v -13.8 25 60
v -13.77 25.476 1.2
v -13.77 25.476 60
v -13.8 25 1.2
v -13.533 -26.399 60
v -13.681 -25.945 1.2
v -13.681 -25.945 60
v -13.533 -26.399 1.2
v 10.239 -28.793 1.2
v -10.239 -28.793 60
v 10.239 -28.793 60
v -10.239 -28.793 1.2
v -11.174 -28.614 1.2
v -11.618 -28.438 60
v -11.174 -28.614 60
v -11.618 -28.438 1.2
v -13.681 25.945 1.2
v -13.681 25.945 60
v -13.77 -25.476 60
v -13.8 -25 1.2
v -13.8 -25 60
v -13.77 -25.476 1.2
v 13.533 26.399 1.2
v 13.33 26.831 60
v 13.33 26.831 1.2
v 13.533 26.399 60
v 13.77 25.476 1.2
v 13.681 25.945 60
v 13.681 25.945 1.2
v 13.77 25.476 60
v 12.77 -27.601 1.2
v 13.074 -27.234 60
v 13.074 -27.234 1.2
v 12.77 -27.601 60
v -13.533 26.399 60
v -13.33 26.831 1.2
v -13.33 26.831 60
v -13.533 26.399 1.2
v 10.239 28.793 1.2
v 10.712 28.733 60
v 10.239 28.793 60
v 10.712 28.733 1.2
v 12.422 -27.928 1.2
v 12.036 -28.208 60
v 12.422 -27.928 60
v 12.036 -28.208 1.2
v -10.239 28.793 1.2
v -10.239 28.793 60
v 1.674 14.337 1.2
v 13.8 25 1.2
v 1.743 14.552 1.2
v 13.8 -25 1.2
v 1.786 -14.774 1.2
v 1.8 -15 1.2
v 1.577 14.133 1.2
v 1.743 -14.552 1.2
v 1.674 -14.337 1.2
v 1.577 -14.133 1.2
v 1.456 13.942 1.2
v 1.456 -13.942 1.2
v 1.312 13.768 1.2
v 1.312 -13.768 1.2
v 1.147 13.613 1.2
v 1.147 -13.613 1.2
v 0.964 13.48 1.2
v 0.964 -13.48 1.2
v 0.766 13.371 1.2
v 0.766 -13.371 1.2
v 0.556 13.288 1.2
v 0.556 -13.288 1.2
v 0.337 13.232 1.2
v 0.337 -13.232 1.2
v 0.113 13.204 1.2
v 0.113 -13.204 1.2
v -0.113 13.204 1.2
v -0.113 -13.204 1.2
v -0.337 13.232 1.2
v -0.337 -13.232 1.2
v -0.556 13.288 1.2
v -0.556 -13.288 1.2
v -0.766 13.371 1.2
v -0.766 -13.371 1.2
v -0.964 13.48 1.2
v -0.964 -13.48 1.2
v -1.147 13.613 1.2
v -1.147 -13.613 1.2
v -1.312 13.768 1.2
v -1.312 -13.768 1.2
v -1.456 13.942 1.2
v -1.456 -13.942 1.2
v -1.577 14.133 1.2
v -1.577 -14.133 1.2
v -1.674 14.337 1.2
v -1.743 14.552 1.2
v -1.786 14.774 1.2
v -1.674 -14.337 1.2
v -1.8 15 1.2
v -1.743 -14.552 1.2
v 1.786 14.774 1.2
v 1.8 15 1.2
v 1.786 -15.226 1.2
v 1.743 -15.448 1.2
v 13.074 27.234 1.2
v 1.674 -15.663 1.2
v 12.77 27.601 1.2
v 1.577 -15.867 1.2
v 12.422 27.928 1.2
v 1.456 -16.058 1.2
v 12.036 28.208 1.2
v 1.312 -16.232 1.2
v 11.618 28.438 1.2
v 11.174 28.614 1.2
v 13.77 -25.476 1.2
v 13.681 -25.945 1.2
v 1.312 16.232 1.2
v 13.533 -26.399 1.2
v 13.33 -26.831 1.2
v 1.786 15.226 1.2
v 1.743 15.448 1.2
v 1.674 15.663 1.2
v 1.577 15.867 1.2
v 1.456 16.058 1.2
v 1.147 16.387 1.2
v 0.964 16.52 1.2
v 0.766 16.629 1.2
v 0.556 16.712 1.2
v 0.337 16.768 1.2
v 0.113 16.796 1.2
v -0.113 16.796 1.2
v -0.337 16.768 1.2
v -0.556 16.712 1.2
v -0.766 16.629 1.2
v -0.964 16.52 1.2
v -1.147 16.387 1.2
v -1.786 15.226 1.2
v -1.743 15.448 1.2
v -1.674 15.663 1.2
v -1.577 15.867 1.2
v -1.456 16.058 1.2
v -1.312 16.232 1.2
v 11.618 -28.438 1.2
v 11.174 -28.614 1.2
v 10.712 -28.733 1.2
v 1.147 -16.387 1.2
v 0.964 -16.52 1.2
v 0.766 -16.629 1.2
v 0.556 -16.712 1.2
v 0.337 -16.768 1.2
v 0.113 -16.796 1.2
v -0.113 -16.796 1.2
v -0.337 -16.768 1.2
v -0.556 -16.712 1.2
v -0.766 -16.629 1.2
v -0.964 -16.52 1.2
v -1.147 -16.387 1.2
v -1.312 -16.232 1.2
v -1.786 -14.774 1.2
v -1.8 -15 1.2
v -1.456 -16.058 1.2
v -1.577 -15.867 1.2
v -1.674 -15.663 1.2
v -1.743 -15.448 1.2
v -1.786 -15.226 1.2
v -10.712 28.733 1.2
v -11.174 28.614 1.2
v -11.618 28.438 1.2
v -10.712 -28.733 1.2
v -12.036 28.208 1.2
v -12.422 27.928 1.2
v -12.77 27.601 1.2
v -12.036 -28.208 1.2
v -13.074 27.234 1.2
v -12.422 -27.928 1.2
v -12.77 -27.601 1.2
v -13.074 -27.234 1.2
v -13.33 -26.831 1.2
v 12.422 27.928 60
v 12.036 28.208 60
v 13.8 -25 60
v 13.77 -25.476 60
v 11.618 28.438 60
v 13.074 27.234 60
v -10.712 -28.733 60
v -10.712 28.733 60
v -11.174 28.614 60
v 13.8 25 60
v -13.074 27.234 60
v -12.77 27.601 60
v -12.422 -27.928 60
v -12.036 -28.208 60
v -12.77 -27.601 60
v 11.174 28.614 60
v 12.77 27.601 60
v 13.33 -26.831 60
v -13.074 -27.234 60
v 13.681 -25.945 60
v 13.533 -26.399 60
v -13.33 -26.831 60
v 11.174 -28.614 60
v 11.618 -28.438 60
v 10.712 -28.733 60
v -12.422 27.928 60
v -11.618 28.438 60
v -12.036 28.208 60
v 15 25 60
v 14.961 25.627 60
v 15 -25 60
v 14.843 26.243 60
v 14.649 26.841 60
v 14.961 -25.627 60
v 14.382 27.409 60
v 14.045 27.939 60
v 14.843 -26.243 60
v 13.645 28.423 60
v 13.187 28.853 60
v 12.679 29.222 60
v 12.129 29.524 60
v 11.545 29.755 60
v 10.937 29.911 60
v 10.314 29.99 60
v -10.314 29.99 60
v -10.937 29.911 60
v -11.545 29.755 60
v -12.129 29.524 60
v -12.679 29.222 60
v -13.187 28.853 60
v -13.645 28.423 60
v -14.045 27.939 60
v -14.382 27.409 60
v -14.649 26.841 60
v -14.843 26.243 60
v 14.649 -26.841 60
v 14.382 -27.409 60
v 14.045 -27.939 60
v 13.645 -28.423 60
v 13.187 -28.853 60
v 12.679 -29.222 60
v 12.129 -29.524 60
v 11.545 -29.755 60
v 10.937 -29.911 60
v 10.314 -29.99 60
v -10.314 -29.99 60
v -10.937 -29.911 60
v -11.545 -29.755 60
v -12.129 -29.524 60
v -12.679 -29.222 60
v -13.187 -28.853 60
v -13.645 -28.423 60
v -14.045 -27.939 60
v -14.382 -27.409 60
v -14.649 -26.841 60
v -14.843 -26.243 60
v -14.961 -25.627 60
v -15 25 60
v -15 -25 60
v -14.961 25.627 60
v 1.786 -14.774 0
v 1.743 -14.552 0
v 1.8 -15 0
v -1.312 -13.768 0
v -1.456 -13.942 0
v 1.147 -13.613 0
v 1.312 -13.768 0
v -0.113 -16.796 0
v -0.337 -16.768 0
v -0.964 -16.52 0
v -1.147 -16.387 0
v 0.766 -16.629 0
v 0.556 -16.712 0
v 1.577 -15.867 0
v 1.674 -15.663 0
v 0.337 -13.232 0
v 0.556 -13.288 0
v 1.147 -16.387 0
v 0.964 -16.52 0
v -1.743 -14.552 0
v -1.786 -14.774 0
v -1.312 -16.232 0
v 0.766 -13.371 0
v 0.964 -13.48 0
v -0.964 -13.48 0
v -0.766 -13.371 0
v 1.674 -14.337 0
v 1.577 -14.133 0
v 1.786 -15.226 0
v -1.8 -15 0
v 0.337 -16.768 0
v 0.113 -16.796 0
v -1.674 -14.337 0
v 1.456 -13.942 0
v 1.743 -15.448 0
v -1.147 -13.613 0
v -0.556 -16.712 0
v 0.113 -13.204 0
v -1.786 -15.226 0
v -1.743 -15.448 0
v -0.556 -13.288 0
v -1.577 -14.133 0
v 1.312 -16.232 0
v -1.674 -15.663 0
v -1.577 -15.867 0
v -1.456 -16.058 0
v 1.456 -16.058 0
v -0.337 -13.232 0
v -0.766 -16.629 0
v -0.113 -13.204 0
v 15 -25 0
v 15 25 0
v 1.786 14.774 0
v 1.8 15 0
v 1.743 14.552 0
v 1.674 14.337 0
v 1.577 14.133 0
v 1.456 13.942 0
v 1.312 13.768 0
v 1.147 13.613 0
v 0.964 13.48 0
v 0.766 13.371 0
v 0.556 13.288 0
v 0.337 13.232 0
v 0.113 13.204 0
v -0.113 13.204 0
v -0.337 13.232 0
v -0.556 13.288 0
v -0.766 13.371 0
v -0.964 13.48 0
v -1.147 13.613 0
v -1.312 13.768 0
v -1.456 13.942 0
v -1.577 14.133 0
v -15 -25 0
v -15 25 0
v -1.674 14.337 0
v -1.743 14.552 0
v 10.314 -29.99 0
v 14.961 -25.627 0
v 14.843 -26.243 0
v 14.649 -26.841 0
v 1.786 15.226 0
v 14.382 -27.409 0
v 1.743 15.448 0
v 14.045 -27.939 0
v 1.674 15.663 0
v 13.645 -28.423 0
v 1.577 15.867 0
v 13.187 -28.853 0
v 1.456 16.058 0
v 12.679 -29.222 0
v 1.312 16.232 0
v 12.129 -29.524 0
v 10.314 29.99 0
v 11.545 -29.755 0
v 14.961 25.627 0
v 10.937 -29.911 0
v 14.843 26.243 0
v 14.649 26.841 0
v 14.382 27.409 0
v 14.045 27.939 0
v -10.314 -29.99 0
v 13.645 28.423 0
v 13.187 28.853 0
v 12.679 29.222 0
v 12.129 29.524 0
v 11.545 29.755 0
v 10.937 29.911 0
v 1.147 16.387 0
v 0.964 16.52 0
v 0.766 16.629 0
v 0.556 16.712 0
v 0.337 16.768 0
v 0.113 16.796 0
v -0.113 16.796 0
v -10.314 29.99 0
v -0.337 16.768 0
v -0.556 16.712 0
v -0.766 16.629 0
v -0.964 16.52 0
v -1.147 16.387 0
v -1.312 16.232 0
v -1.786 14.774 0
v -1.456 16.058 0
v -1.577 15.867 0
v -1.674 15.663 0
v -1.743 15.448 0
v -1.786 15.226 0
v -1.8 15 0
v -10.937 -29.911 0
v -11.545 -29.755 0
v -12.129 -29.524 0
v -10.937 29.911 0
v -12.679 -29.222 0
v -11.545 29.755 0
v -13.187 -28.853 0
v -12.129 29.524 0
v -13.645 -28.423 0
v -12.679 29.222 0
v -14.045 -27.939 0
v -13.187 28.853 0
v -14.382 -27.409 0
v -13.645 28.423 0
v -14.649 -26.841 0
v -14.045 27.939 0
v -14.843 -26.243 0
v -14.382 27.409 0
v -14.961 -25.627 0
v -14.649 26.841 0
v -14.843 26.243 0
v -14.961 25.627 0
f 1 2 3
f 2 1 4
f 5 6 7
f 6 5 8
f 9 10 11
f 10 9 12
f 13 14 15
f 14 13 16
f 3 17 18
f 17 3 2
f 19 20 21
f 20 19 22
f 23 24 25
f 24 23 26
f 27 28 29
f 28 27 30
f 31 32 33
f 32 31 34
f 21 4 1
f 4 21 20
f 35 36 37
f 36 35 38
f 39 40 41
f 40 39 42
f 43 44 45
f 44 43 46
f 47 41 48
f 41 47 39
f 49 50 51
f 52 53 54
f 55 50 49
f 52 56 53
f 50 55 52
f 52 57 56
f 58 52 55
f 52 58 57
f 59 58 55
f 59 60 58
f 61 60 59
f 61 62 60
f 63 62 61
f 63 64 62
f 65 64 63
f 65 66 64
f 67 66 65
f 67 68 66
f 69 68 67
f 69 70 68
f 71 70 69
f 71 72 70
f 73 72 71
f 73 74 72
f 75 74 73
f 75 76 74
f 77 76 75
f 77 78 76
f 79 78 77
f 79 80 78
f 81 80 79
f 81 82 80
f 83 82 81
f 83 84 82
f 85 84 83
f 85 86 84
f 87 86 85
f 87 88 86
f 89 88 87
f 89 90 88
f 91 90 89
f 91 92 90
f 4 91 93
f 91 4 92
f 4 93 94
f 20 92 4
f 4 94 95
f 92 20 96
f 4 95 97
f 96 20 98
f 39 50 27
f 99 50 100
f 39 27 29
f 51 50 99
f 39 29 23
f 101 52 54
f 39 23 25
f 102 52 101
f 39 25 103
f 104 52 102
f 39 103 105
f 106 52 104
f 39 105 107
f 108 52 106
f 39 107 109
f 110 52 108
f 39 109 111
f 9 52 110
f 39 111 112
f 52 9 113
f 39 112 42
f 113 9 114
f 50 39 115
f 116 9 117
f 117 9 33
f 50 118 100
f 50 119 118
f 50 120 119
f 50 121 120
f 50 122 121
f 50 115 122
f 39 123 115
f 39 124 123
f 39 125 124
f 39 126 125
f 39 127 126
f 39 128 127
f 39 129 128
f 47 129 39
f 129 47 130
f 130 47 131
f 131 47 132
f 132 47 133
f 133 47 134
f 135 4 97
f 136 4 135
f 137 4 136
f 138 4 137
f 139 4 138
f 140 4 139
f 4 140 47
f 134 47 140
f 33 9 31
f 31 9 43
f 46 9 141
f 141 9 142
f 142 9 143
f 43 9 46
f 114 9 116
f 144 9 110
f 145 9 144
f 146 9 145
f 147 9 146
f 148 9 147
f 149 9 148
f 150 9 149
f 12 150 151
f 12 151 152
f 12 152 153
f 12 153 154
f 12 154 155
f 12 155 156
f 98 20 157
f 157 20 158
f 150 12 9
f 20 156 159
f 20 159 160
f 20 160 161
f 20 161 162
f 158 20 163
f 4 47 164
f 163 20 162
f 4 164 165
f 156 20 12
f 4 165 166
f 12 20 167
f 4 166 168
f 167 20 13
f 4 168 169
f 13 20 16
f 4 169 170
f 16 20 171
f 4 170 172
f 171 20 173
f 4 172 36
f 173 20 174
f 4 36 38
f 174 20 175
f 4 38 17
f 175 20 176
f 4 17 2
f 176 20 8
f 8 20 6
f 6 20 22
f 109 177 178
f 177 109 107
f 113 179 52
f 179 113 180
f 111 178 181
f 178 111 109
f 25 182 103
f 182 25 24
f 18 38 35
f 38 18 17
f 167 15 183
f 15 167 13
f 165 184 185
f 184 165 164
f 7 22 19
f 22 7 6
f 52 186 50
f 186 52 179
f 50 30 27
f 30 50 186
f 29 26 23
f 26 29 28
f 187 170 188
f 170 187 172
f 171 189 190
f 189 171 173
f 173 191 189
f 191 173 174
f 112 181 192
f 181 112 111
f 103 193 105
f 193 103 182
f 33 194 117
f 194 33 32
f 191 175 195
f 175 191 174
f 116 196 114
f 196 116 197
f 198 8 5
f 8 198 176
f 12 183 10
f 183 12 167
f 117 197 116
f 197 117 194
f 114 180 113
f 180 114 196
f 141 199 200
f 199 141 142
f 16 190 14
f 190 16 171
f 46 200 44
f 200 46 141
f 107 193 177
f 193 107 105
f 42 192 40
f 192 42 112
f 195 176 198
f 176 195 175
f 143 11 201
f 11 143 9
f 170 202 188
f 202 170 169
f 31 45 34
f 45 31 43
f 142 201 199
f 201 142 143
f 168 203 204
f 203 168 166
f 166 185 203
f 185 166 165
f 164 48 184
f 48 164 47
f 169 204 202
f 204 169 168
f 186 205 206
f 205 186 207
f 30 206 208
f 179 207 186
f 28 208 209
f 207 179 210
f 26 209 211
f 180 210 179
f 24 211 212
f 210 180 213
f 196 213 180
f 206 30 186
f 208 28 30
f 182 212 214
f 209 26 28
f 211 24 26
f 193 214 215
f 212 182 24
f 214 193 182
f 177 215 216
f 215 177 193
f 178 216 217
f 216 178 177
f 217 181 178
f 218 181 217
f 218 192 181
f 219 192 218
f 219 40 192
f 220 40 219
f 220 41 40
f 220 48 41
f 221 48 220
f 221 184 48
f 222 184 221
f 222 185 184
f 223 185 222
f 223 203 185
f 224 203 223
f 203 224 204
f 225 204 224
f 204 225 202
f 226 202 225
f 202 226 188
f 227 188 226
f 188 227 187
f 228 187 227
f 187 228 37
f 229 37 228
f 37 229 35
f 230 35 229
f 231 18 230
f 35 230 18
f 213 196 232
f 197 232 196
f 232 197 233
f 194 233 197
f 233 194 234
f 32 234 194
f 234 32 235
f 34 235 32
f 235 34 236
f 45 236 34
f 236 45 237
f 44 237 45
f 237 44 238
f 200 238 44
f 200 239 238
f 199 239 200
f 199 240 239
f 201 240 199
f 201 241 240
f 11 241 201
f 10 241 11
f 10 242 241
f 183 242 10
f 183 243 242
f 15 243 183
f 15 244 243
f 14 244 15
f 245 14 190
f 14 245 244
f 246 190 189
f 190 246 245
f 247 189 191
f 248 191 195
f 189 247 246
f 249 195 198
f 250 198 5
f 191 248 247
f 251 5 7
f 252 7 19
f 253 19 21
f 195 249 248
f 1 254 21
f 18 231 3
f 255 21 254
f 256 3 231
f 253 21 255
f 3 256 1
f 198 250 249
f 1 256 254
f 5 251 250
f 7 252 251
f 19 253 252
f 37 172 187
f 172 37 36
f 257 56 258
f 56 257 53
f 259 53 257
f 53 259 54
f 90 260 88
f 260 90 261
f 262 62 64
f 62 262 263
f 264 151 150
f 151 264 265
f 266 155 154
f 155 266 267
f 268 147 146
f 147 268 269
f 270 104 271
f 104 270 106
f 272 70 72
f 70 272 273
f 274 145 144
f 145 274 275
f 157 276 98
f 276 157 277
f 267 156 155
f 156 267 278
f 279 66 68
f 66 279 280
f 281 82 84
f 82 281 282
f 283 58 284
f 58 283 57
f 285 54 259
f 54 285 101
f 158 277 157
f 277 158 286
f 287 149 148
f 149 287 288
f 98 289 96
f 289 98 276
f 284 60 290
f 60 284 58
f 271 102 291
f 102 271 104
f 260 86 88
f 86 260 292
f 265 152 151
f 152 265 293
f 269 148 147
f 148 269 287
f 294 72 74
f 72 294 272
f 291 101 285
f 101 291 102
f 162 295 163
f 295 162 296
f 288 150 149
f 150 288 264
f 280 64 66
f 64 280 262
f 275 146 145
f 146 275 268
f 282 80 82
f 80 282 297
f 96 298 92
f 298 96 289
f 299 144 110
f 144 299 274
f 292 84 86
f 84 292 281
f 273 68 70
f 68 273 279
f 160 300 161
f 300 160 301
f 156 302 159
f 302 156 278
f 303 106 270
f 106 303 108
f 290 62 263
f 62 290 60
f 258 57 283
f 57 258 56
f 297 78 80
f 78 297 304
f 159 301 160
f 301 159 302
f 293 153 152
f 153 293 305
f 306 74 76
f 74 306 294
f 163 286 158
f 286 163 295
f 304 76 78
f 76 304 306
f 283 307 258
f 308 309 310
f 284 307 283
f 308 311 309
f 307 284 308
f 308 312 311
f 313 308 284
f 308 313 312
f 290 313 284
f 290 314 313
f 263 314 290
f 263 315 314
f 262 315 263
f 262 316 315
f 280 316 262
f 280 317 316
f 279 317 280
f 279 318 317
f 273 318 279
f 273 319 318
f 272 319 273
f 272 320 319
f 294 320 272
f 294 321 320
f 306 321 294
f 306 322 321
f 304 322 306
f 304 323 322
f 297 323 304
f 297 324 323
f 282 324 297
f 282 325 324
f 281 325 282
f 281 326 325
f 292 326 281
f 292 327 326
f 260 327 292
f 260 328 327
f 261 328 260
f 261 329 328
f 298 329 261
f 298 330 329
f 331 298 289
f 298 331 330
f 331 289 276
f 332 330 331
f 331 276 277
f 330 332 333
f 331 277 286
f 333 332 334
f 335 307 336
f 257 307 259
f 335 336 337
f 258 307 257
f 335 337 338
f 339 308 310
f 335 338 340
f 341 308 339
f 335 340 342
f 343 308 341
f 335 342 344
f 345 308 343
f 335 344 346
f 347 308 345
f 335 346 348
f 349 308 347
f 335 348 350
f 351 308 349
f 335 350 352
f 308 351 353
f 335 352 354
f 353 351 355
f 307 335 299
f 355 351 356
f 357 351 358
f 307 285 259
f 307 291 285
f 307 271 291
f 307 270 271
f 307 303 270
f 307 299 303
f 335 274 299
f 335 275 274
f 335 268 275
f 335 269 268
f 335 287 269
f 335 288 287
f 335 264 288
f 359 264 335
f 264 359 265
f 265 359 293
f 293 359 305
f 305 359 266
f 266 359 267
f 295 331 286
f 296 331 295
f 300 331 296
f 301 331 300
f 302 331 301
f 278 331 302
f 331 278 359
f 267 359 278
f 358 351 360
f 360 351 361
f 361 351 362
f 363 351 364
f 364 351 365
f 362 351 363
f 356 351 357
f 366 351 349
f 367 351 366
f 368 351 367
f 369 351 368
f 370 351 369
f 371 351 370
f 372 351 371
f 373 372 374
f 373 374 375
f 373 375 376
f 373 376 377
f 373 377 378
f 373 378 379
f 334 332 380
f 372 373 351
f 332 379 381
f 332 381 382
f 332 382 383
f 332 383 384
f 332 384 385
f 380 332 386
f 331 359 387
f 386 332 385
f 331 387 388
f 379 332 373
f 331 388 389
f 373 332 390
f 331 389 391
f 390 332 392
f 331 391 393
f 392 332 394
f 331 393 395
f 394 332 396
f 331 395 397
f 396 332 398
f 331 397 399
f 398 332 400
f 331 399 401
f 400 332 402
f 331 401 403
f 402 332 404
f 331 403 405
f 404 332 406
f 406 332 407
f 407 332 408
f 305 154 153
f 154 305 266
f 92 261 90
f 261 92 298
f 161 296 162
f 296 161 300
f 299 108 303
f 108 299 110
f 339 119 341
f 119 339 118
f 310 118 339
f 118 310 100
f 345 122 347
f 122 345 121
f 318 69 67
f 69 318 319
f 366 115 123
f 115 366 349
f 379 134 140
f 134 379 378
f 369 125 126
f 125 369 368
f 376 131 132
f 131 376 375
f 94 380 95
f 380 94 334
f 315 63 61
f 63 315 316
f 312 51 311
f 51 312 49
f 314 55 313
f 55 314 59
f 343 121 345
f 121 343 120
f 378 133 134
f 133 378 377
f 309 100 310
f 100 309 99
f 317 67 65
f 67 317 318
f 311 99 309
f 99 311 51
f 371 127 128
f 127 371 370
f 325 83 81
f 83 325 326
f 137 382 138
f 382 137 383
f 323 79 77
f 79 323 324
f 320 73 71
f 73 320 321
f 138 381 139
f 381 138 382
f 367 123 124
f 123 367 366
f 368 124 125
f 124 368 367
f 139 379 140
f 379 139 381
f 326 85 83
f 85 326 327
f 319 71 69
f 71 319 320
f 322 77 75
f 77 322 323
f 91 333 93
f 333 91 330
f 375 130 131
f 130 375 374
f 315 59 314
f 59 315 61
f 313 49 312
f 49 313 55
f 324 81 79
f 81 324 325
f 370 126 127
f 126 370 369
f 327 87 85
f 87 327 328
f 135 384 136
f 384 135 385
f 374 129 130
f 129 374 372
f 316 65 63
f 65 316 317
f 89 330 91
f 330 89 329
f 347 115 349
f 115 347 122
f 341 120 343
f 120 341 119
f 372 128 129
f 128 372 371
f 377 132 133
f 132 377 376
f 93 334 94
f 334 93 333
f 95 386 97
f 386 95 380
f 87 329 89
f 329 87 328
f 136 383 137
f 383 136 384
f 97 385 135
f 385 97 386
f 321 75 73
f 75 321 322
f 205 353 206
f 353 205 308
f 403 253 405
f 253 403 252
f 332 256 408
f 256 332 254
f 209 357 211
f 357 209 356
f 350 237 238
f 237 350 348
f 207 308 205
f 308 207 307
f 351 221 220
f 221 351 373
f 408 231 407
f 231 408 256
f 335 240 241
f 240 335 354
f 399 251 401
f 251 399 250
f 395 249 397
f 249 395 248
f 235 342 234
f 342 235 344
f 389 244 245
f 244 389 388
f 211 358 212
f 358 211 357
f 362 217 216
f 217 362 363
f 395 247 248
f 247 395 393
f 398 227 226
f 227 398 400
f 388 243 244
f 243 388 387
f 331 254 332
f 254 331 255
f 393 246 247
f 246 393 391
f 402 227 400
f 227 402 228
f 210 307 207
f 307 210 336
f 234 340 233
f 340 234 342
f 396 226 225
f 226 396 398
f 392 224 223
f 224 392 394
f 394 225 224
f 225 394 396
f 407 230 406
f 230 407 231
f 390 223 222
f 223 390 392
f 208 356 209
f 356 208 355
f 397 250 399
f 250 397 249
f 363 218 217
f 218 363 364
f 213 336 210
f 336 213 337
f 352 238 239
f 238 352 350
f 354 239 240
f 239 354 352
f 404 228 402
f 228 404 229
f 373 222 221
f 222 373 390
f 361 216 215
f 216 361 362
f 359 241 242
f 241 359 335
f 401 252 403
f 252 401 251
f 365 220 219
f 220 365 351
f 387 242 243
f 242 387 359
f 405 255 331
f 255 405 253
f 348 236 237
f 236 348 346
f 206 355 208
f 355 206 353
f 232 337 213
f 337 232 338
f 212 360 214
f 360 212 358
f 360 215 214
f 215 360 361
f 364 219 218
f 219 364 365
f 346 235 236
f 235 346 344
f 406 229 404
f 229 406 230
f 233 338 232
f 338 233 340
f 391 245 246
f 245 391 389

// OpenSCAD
$fn = 50;


difference() {
	union() {
		hull() {
			translate(v = [-10.0000000000, 25.0000000000, 0]) {
				cylinder(h = 60, r = 5);
			}
			translate(v = [10.0000000000, 25.0000000000, 0]) {
				cylinder(h = 60, r = 5);
			}
			translate(v = [-10.0000000000, -25.0000000000, 0]) {
				cylinder(h = 60, r = 5);
			}
			translate(v = [10.0000000000, -25.0000000000, 0]) {
				cylinder(h = 60, r = 5);
			}
		}
	}
	union() {
		translate(v = [0, 0, 1.2000000000]) {
			hull() {
				translate(v = [-10.0000000000, 25.0000000000, 0]) {
					cylinder(h = 58.8000000000, r = 3.8000000000);
				}
				translate(v = [10.0000000000, 25.0000000000, 0]) {
					cylinder(h = 58.8000000000, r = 3.8000000000);
				}
				translate(v = [-10.0000000000, -25.0000000000, 0]) {
					cylinder(h = 58.8000000000, r = 3.8000000000);
				}
				translate(v = [10.0000000000, -25.0000000000, 0]) {
					cylinder(h = 58.8000000000, r = 3.8000000000);
				}
			}
		}
		#translate(v = [0.0000000000, -15.0000000000, 0]) {
			cylinder(h = 1.2000000000, r = 1.8000000000);
		}
		#translate(v = [0.0000000000, 15.0000000000, 0]) {
			cylinder(h = 1.2000000000, r = 1.8000000000);
		}
	}
}
